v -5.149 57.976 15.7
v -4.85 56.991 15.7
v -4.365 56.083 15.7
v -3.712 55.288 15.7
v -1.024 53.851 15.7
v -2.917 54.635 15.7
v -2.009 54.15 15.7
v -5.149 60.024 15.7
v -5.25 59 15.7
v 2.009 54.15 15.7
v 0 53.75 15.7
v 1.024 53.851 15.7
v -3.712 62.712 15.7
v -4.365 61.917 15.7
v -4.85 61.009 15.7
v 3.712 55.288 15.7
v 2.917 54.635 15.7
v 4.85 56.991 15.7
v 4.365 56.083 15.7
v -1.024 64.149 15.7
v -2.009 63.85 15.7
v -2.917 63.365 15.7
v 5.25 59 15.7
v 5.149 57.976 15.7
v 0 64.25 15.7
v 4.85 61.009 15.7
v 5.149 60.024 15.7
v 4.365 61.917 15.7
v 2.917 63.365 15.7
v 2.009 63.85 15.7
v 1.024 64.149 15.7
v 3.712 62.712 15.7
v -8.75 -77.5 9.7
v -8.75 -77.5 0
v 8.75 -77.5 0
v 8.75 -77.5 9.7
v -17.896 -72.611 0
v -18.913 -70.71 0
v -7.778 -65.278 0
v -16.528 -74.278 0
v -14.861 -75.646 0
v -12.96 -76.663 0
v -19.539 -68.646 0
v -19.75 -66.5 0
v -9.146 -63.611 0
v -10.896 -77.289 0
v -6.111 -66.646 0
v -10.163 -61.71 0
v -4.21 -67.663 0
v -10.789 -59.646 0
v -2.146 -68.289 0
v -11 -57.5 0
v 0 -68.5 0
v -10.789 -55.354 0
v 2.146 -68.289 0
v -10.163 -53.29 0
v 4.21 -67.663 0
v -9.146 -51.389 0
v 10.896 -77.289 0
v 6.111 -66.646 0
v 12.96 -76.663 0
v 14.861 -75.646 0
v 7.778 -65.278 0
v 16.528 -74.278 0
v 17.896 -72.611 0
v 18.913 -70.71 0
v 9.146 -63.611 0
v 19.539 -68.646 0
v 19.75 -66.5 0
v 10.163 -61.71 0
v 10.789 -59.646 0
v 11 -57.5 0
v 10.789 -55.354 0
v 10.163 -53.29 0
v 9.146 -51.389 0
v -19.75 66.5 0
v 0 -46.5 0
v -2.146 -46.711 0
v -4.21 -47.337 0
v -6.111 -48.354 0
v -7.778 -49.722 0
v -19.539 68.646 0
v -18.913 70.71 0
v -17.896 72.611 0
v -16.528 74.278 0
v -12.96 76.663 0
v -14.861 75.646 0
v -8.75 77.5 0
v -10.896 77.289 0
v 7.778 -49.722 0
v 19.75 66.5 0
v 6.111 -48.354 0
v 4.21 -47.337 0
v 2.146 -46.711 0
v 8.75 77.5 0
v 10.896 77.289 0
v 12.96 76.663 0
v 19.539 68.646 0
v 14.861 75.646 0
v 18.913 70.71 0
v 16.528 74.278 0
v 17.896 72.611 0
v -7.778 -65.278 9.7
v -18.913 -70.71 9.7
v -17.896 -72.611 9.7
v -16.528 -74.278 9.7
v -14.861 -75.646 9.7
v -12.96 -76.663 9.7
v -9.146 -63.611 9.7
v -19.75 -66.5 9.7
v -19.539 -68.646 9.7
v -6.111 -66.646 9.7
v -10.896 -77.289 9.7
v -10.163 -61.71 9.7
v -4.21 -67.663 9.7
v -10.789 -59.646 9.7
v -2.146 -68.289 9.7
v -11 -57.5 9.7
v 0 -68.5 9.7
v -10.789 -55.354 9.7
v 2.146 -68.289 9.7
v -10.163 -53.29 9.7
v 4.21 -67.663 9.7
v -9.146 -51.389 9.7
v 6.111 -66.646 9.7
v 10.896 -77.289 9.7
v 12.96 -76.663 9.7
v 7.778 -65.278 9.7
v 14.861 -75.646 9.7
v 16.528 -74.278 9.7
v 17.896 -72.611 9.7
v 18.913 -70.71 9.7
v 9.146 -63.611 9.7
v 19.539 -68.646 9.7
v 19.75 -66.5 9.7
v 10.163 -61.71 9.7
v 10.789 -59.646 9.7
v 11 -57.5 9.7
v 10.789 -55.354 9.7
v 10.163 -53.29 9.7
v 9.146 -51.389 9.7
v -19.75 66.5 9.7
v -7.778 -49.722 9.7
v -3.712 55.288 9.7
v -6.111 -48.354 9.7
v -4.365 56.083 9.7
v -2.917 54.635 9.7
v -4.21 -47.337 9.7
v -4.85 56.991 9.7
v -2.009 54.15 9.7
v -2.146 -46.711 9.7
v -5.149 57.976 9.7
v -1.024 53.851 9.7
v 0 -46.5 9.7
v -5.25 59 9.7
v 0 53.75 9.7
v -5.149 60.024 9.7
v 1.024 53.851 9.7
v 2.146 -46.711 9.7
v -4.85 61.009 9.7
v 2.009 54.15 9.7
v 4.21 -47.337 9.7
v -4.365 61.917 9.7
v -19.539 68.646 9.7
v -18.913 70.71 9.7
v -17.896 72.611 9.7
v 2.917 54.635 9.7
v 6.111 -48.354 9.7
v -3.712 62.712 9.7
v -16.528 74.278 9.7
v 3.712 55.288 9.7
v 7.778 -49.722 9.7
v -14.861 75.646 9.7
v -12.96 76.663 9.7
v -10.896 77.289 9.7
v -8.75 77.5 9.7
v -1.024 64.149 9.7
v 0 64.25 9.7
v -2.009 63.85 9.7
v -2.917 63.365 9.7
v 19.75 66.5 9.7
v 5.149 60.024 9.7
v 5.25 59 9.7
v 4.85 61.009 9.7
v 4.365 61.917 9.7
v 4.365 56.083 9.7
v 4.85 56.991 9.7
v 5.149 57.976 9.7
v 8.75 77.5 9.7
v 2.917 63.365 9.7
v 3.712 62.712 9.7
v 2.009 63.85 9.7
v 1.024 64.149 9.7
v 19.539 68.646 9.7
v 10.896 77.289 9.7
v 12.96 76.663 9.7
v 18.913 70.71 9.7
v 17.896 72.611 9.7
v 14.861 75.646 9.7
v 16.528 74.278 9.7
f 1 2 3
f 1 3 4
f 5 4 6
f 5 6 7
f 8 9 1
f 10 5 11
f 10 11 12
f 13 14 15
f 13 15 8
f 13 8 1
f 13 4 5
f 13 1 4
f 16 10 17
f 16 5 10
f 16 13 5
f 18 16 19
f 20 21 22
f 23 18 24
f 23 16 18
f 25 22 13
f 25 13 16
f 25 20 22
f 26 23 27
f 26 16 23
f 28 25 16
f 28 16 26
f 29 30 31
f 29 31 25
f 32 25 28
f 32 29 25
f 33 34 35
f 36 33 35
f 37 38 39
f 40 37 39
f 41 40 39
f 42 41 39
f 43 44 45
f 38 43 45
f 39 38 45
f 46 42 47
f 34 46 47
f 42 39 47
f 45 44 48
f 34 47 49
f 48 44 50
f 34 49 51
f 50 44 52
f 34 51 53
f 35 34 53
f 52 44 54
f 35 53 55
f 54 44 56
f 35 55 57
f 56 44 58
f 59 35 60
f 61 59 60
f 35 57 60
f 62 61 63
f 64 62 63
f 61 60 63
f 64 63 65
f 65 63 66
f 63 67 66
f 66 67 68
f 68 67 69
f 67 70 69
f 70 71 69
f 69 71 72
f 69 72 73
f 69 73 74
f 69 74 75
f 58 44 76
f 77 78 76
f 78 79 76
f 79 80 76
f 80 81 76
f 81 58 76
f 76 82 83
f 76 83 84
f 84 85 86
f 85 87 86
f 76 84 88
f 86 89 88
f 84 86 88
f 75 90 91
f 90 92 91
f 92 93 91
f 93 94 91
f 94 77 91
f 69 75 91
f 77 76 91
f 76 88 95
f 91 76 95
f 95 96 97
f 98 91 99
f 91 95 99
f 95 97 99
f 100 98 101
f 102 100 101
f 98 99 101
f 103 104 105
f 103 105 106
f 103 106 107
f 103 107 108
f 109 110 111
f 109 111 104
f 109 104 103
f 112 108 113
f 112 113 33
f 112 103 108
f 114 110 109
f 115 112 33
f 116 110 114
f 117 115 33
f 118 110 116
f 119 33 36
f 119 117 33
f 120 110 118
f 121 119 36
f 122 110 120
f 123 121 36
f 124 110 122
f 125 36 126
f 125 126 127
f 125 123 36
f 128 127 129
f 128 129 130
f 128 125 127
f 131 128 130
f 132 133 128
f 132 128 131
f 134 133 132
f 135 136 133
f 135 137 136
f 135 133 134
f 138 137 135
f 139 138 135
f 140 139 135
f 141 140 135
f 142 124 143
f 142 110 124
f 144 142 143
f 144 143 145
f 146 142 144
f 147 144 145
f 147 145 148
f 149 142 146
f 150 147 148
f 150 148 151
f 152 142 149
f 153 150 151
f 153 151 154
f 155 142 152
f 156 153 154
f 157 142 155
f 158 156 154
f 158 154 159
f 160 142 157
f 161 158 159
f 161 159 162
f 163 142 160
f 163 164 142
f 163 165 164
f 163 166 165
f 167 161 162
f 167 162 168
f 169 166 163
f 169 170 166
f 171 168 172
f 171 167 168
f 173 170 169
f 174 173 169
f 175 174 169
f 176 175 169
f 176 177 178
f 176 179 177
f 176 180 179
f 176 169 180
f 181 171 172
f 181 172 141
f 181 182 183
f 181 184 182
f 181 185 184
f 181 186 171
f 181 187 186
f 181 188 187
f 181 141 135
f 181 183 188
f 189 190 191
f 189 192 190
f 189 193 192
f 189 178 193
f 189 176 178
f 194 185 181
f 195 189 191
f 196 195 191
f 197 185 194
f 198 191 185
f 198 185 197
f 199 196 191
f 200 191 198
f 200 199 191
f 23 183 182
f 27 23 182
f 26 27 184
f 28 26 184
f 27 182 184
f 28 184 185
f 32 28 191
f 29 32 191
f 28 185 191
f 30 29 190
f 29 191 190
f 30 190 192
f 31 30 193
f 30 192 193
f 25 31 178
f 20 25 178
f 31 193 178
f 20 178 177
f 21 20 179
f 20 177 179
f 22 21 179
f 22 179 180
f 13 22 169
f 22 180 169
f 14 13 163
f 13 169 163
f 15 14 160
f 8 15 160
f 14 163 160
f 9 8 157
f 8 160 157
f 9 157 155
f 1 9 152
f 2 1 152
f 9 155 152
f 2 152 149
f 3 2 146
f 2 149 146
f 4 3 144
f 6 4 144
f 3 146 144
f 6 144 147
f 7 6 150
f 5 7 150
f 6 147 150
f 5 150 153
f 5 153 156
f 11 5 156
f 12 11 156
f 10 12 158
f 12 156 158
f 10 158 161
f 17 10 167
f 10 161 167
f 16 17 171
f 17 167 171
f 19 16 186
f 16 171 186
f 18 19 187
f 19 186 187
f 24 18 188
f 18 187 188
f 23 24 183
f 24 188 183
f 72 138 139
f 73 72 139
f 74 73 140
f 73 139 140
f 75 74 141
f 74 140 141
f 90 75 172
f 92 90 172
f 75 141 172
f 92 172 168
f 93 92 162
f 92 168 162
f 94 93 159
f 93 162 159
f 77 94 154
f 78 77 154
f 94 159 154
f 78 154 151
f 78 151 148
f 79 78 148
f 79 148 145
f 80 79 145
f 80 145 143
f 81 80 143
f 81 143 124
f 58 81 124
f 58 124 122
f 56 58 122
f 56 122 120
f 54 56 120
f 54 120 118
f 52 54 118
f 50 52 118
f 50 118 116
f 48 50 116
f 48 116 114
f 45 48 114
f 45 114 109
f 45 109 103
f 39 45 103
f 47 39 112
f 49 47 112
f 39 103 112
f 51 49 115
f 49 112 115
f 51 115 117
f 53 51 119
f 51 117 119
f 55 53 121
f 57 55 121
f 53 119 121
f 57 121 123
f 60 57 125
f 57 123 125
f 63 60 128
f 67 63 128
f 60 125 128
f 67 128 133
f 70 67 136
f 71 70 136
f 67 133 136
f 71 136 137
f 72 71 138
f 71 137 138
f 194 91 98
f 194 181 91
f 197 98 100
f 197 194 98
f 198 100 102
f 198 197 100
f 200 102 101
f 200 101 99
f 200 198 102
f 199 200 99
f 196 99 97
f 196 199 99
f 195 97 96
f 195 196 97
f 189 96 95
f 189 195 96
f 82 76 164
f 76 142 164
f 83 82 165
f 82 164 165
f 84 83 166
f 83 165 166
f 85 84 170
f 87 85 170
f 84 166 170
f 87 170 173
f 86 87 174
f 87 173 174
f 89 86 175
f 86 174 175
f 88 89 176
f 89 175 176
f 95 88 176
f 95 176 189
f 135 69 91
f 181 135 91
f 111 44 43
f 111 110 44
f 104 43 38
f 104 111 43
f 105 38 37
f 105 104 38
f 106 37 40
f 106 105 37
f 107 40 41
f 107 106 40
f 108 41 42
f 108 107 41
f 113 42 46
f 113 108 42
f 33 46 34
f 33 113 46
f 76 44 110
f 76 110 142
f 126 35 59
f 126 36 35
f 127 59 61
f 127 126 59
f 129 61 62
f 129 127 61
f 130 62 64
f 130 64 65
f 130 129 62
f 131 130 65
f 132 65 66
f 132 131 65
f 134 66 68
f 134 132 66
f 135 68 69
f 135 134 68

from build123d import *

# Parameters (mm, degrees)
F0_W     = 39.5
F0_H     = 155
F1_DEPTH = 9.7
F2_R     = 11
F3_R     = 11
F4_DEPTH = 9.701
F5_R     = 5.25
F6_DEPTH = 6


with BuildPart() as f1:
    # F0 (on Top) → F1 (new body)
    with BuildSketch(Plane.XY):
        Rectangle(F0_W, F0_H)
    extrude(amount=F1_DEPTH)

    # F2
    f2_edges = [f1.edges().sort_by_distance(p)[0] for p in [
        (-19.75, 77.5, 4.85),
        (19.75, 77.5, 4.85),
        (19.75, -77.5, 4.85),
        (-19.75, -77.5, 4.85),
    ]]
    fillet(f2_edges, radius=F2_R)

    # F3 (on face) → F4 (cut, through all)
    with BuildSketch(Plane.XY.offset(9.7)):
        with Locations((0, -57.5)):
            Circle(F3_R)
    extrude(amount=-F4_DEPTH, mode=Mode.SUBTRACT)

    # F5 (on face) → F6 (join)
    with BuildSketch(Plane.XY.offset(9.7)):
        with Locations((0, 59)):
            Circle(F5_R)
    extrude(amount=F6_DEPTH)


solid = f1.part
